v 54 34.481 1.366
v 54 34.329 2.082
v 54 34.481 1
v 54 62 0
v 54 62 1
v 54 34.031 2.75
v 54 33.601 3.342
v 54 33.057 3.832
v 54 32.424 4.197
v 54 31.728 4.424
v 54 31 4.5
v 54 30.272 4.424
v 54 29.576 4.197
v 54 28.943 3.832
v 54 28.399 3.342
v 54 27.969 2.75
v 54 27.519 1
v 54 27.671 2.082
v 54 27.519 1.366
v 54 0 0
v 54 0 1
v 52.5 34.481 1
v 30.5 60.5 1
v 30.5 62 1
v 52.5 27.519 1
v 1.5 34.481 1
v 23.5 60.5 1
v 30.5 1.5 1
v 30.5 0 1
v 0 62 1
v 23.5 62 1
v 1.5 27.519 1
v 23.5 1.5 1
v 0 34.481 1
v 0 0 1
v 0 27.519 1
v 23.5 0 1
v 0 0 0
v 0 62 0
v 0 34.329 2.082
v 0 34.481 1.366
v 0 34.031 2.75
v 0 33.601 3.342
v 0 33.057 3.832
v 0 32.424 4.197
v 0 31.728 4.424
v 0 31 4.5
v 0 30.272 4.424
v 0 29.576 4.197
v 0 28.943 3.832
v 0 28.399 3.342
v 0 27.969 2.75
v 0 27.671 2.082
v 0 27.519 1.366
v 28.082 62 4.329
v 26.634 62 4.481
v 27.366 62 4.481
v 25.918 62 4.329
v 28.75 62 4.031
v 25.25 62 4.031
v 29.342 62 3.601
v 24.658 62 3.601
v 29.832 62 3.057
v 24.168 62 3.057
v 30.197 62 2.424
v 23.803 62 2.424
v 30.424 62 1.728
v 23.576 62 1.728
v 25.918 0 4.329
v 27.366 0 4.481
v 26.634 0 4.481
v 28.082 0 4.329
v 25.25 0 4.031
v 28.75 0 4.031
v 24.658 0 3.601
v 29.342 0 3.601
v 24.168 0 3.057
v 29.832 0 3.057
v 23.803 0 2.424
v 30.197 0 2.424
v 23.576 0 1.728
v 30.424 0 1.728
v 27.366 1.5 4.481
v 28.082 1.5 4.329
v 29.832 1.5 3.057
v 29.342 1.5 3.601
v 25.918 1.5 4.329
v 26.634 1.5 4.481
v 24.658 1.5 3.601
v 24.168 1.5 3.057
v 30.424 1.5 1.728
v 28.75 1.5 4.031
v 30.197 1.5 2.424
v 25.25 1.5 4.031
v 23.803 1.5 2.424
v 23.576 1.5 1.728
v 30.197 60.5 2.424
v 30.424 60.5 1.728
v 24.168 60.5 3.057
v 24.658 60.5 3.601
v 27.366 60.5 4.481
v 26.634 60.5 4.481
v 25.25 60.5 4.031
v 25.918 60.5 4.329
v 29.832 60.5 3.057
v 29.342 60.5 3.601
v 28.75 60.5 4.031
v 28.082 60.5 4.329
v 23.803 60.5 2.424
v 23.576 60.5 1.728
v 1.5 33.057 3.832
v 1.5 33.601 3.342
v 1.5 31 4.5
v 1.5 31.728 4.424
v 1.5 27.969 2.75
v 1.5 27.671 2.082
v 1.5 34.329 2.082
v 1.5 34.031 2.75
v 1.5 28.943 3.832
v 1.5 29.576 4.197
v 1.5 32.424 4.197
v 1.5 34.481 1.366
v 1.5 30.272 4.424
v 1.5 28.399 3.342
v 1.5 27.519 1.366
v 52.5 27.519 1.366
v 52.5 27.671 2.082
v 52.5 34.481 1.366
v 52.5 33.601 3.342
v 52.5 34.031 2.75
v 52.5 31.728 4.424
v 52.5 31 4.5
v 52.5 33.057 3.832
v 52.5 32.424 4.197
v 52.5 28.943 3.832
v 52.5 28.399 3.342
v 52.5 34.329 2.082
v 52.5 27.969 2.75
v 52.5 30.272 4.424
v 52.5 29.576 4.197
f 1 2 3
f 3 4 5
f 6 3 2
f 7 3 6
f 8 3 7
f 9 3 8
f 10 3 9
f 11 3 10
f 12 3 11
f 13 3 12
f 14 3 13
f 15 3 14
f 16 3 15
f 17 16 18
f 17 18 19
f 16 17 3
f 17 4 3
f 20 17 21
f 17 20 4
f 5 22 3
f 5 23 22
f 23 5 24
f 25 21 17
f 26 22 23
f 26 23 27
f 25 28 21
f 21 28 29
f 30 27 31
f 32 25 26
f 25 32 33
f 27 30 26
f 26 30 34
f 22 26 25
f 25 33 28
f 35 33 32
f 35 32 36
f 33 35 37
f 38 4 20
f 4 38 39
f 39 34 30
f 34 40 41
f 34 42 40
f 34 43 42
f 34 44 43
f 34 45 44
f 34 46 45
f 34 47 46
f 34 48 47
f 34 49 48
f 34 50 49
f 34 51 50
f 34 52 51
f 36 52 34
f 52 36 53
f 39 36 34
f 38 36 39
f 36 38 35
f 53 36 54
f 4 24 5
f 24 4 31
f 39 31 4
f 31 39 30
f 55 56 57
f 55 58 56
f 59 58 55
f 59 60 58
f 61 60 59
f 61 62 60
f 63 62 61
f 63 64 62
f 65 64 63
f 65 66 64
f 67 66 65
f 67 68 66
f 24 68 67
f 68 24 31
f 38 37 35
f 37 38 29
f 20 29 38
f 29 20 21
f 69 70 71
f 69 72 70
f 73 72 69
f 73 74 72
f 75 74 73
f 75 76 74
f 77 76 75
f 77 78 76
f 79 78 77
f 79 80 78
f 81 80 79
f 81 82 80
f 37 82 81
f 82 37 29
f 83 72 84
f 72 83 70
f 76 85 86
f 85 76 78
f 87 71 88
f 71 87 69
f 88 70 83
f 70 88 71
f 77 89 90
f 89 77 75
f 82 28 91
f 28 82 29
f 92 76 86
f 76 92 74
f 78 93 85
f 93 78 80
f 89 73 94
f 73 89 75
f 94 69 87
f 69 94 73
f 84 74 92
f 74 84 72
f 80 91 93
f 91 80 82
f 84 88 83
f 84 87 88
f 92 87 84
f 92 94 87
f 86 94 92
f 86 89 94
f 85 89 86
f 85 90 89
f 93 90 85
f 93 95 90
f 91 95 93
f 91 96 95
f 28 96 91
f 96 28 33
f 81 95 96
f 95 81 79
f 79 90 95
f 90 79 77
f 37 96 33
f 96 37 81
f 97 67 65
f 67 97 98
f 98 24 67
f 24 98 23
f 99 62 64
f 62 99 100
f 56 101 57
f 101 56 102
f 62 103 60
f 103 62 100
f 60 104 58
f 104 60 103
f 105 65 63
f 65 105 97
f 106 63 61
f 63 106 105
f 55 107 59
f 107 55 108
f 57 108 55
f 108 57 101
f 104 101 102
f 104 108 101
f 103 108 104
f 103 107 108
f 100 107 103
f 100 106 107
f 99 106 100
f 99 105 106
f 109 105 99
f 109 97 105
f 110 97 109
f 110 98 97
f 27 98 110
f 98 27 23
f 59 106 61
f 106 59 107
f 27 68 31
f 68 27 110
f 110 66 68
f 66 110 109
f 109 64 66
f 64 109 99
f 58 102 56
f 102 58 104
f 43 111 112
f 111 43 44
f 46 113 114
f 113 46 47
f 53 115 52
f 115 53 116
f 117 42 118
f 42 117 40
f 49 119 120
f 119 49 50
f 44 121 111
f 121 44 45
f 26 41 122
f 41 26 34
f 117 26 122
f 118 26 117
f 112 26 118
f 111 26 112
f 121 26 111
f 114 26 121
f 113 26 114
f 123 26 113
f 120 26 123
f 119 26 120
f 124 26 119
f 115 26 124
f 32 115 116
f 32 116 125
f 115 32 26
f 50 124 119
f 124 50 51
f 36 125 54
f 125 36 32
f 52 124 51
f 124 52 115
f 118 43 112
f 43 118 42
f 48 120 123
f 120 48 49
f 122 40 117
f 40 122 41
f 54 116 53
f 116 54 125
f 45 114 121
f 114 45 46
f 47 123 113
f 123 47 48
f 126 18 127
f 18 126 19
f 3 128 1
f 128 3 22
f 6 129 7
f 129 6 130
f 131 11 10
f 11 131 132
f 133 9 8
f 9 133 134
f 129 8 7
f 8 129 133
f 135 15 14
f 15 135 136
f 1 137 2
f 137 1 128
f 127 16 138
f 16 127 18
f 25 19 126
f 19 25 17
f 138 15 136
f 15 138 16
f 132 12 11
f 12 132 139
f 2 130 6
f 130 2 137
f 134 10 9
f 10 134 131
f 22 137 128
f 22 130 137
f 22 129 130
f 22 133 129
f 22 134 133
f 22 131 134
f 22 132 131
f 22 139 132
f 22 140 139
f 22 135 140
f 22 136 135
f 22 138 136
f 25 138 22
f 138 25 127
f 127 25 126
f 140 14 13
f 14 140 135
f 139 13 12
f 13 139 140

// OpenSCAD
// file: consts.scad
$fs = 0.5;

FLOOR = 1;
WALL = 1.5;
THIN_WALL = 0.6;

SQUARE_TILE = 27; // 25.46mm
TILE_THICK = 3; // 2.18

RESOURCE_TOKEN_STACK = 53; // 51.43mm, 32 tokens

RESOURCE_CARD_W = 46; // 44.05
RESOURCE_CARD_H = 70; // 68.03
RESOURCE_CARD_STACK = 4; // 2.5mm

ACHIEVEMENT_STACK = 6; // 4.72mm

FIRST_PLAYER_H = 31; // 29.12mm
FIRST_PLAYER_W = 27; // 25.19mm
FIRST_PLAYER_D = 11.5; // 9.94mm


CUBE = 9; // 8.6mm

VOTING_TRIANGLE = 29; // 27.44mm
VOTING_STACK = 28; // 26.17, 12 tokens

// Discs
CLAIM_DIA = 13; // 11.83
CLAIM_H = 4; //3.78
CLAIM_STACK = 58; // 55.58

// TOKEN_STACK = 21; // 19.56, 9 tokens
TOKEN_STACK = 14; // 13.02, 6 square tokens

// Cubes
DELIVERY_STACK_D = 58; //55.71
DELIVERY_STACK_W = 18; //16.30
DELIVERY_STACK_H = DELIVERY_STACK_W;

MEEPLE_W = 17; //16.30
MEEPLE_H = 21; //20.23
MEEPLE_STACK = 30.5; //29.01

MONEY_1_DIA = 22.5; //21.22
MONEY_1_STACK = 51; // 49.60
MONEY_3_DIA = 27; //25.64
MONEY_3_STACK = 25.6; //23.97

ROAD_STACK = 53; //51.43

TOKEN_BOX_W = DELIVERY_STACK_W + MEEPLE_W + CLAIM_DIA + WALL * 4;
TOKEN_BOX_D = max(DELIVERY_STACK_D, SQUARE_TILE + WALL + MEEPLE_STACK, CLAIM_STACK) + WALL*2;
TOKEN_BOX_H = DELIVERY_STACK_H + FLOOR - CUBE/2;
TOKEN_BOX_LID_H = FLOOR*2 + SQUARE_TILE - TOKEN_BOX_H;

// Keep the Influence Tokens box the same size to allow stacking
INFLUENCE_BOX_W = TOKEN_BOX_W;
INFLUENCE_BOX_D = TOKEN_BOX_D;
INFLUENCE_BOX_H = (TOKEN_BOX_H + TOKEN_BOX_LID_H + FLOOR)/2;

BANK_BOX_W = MONEY_1_DIA + MONEY_3_DIA + SQUARE_TILE + WALL*4;
BANK_BOX_D = max(MONEY_1_STACK, MONEY_3_STACK, ROAD_STACK) + WALL*2;
BANK_BOX_H = max(MONEY_1_DIA, MONEY_3_DIA, SQUARE_TILE)/2 + FLOOR;

CARD_W = 65; // 63.42
CARD_H = 91; // 89.37

CARD_STACK_INCOME = 1.5; // 0.62, 2 cards
CARD_STACK_ACTION = 2.5; // 1.54, 5 cards, 4 stacks of these
CARD_STACK_ADVISOR = 6.5; // 5.55, 18 cards
CARD_STACK_BUILDING = 7.5; // 6.52, 21 cards

CARD_BOX_W = WALL*2 + CARD_H;
CARD_BOX_D = TOKEN_BOX_W; // These should match for putting in the box
//CARD_BOX_D = WALL*3 + THIN_WALL*6 + CARD_STACK_INCOME + CARD_STACK_ACTION*4 + CARD_STACK_ADVISOR + CARD_STACK_BUILDING + VOTING_STACK/2;
CARD_BOX_H = CARD_W/2 + FLOOR;
CARD_BOX_SPACING = (CARD_BOX_D - CARD_STACK_INCOME - CARD_STACK_ACTION*4 - CARD_STACK_ADVISOR - CARD_STACK_BUILDING - VOTING_STACK/2)/9;

CARD_BOX_LID_W = CARD_BOX_W;
CARD_BOX_LID_D = WALL + VOTING_STACK/2 + THIN_WALL;
CARD_BOX_LID_H = SQUARE_TILE/2 + FLOOR;
VOTING_GAP = (CARD_BOX_W - VOTING_TRIANGLE*2)/3;

CLIP_DIA = 7;

RESOURCE_BOX_W = RESOURCE_CARD_H + WALL*2;
RESOURCE_BOX_D = RESOURCE_CARD_STACK + ACHIEVEMENT_STACK + SQUARE_TILE + WALL*3 + THIN_WALL*1;
RESOURCE_BOX_H = RESOURCE_CARD_W/2 + FLOOR;

// *** Resource Buildings ***

R_STACK = 8; // 6.45, 3 cards
R_STACK_2 = 6; // 4.40
R_STACK_4 = 10; // 8.75

R_1 = 27;
R_2 = 52;
R_3 = 78;
R_4 = 103;
//TIER3_FULL_STACK = 25.89
R_WEAPONS_W_SQ = R_4; //101.60
R_WEAPONS_H_SQ = R_1; //25.72
R_WEAPONS_ANG = 75; // Figured out using brute force, brain melted figuring out formula
R_WEAPONS_W = R_WEAPONS_H_SQ*cos(R_WEAPONS_ANG) + R_WEAPONS_W_SQ*sin(R_WEAPONS_ANG);
R_WEAPONS_H = R_WEAPONS_W_SQ*cos(R_WEAPONS_ANG) + R_WEAPONS_H_SQ*sin(R_WEAPONS_ANG);

R_CLOTH_W = R_2; // 50.77
R_CLOTH_H = R_2;

R_GOV_W = R_3; // 76.40
R_GOV_H = R_2; // 50.95

R_LABOR_W = R_3; // 76.34
R_LABOR_H = R_2; // 50.91

TIER3_W = R_WEAPONS_W + WALL*2;
TIER3_H = R_1 + FLOOR + WALL; // Add in WALL to ensure there is a small lip for the top "row"
TIER3_D = R_STACK*4 + WALL*2 + THIN_WALL*3;

R_BRICK_W = R_3;
R_BRICK_H = R_1;

R_FOOD_W = R_2;
R_FOOD_H = R_2;

R_BOOKS_W = R_3;
R_BOOKS_H = R_1;

R_MACH_W = R_2;
R_MACH_H = R_2;

R_LEATHER_W = R_3;
R_LEATHER_H = R_1;

R_JEWELRY_W = R_2;
R_JEWELRY_H = R_2;

R_3x1_ANG = 70;
R_3x1_W = R_1*cos(R_3x1_ANG) + R_3*sin(R_3x1_ANG);
R_3x1_H = R_3*cos(R_3x1_ANG) + R_1*sin(R_3x1_ANG);

TIER2_W = R_3x1_W + WALL*2;
TIER2_H = TIER3_H;
TIER2_D = R_STACK*6 + WALL*2 + THIN_WALL*5;

R_PREST_1x2_W = R_1;
R_PREST_1x2_H = R_2;
R_PREST_1x2_STACK = R_STACK_2;

R_PREST_1x3_W = R_3;
R_PREST_1x3_H = R_1;
R_PREST_1x3_STACK = R_STACK_4;

R_PREST_L_W = R_2;
R_PREST_L_H = R_2;
R_PREST_L_STACK = R_STACK_2;

R_PREST_T_W = R_3;
R_PREST_T_H = R_2;
R_PREST_T_STACK = R_STACK_2;

R_PREST_Z_W = R_3;
R_PREST_Z_H = R_2;
R_PREST_Z_STACK = R_STACK_2;

R_PREST_LL_W = R_3;
R_PREST_LL_H = R_2;
R_PREST_LL_STACK = R_STACK_2;

R_PREST_2x2_W = R_2;
R_PREST_2x2_H = R_2;
R_PREST_2x2_STACK = R_STACK_2;

R_PREST_ODD_W = R_3;
R_PREST_ODD_H = R_2;
R_PREST_ODD_STACK = R_STACK;

COMPLETION_MARKER_W = 22; // 20.03
COMPLETION_MARKER_H = 17; // 15.93
COMPLETION_MARKER_D = 11; // 9.87

PRESTIGE_W = R_PREST_L_W + R_PREST_1x2_W + THIN_WALL + WALL*2;
PRESTIGE_D = R_PREST_ODD_STACK + R_PREST_2x2_STACK+ R_PREST_LL_STACK+ R_PREST_Z_STACK+ R_PREST_T_STACK+ R_PREST_L_STACK+ R_PREST_1x3_STACK+ COMPLETION_MARKER_W + WALL*3 + THIN_WALL * 6;
PRESTIGE_H = R_1 + FLOOR + WALL; // Add in WALL to ensure there is a small lip for the top "row"
// main file
include <consts.scad>;

echo("Influence Tokens Lid (WxDxH):", INFLUENCE_BOX_W, INFLUENCE_BOX_D, FLOOR);

difference() {
    union() {
        cube([INFLUENCE_BOX_W, INFLUENCE_BOX_D, FLOOR]); // Keep this the same size as the player tokens.
        translate([INFLUENCE_BOX_W/2, 0, FLOOR]) rotate([-90, 0, 0]) cylinder(d=CLIP_DIA, h=WALL);
        translate([INFLUENCE_BOX_W/2, INFLUENCE_BOX_D, FLOOR]) rotate([90, 0, 0]) cylinder(d=CLIP_DIA, h=WALL);
        translate([0, INFLUENCE_BOX_D/2, FLOOR]) rotate([0, 90, 0]) cylinder(d=CLIP_DIA, h=WALL);
        translate([INFLUENCE_BOX_W, INFLUENCE_BOX_D/2, FLOOR]) rotate([0, -90, 0]) cylinder(d=CLIP_DIA, h=WALL);
    }
    translate([0, 0, -10]) cube([INFLUENCE_BOX_W, INFLUENCE_BOX_D, 10]);

}
